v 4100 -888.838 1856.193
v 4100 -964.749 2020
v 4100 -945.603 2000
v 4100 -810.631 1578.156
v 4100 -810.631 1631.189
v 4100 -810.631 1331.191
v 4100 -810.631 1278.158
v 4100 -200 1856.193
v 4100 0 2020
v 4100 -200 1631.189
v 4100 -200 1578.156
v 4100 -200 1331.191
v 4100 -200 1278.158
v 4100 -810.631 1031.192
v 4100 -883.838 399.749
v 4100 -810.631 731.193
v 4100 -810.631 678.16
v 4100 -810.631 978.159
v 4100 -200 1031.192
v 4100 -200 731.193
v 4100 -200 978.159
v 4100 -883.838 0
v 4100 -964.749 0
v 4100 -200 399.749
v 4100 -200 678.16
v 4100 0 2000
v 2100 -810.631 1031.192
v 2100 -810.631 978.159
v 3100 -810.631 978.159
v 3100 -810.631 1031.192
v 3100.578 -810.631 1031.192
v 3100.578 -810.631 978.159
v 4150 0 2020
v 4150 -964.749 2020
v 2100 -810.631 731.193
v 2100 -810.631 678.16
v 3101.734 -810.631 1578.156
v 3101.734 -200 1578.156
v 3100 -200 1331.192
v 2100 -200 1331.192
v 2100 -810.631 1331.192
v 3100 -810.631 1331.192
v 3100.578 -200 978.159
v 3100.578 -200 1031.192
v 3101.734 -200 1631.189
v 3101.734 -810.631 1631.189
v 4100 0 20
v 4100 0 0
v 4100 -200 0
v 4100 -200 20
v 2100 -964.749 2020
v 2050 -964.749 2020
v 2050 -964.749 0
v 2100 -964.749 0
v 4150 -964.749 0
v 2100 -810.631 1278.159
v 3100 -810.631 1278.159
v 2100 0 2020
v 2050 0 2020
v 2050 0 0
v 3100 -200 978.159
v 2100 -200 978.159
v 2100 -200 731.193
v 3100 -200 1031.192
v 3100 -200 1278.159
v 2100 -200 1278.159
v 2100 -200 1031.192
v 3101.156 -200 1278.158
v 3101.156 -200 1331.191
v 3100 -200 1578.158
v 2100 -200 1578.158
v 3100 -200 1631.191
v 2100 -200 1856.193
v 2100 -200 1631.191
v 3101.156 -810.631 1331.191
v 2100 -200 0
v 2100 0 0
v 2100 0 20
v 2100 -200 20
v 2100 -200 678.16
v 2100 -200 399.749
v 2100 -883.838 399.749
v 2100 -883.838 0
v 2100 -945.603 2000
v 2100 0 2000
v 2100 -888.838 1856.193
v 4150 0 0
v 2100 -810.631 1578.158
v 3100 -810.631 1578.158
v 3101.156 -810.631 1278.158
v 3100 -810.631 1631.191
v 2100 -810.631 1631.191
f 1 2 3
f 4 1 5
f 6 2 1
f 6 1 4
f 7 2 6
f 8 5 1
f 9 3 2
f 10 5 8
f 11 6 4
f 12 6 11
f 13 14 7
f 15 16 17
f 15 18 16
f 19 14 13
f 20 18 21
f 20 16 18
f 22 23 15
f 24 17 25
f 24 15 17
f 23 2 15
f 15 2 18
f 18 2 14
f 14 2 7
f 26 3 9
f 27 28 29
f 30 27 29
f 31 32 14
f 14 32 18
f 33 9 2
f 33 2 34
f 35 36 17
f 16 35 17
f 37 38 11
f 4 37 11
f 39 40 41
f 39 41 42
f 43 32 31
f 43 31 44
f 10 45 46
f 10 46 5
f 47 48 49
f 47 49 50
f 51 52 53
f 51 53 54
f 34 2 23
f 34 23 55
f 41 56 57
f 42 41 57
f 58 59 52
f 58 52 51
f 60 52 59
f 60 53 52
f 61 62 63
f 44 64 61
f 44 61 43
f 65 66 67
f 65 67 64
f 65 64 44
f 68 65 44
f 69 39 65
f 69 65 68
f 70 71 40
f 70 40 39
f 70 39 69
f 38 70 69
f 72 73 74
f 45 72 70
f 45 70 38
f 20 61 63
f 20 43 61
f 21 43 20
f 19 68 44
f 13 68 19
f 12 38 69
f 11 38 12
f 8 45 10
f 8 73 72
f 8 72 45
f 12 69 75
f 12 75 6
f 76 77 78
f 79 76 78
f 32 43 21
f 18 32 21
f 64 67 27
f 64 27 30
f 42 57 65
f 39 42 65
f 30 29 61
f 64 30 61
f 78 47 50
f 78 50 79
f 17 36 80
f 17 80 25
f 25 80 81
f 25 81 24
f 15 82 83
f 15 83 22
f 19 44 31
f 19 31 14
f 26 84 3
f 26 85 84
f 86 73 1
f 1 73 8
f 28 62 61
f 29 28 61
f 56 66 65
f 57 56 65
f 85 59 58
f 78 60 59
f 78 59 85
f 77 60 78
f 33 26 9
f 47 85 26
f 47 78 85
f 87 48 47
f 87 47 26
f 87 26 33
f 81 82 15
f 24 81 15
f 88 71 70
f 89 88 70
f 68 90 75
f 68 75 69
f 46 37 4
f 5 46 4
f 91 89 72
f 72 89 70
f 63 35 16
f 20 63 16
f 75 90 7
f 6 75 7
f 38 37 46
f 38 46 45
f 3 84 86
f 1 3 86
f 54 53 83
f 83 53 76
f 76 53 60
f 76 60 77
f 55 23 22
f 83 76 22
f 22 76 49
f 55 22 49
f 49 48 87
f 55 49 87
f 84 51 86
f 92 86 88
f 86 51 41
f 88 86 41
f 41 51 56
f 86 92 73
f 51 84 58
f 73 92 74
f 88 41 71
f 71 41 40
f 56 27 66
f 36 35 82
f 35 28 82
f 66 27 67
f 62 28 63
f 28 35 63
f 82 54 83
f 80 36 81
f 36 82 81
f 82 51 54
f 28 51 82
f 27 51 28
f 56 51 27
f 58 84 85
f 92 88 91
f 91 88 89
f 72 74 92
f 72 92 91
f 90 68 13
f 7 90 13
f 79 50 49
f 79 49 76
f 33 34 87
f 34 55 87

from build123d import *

# Parameters (mm, degrees)
BOSS_EXTRUDE1_DEPTH = 2000
SKETCH2_W           = 143.807096291
SKETCH2_H           = 56.765959062
BOSS_EXTRUDE2_DEPTH = 50
SKETCH3_W           = 50
SKETCH3_H           = 143.807096291
BOSS_EXTRUDE3_DEPTH = 19.145261779
SKETCH4_W           = 2050
SKETCH4_H           = 143.807096291
BOSS_EXTRUDE4_DEPTH = 888.8375165
SKETCH5_W           = 143.807096291
SKETCH5_H           = 945.603475562
BOSS_EXTRUDE5_DEPTH = 50
SKETCH6_W           = 50
SKETCH6_H           = 143.807096291
BOSS_EXTRUDE6_DEPTH = 19.145261779
BOSS_EXTRUDE7_DEPTH = 1856.192903709
SKETCH8_W           = 50
SKETCH8_H           = 964.748737342
BOSS_EXTRUDE8_DEPTH = 20
SKETCH9_W           = 50
SKETCH9_H           = 964.748737342
BOSS_EXTRUDE9_DEPTH = 20
SKETCH10_W          = 2000
SKETCH10_H          = 1456.444166367
CUT_EXTRUDE1_DEPTH  = 683.8375165
SKETCH11_W          = 2000
SKETCH11_H          = 20
CUT_EXTRUDE2_DEPTH  = 200
RIB1_REACH          = 4461.071
SKETCH12_WALL_W     = 10920.142474856
SKETCH12_WALL_H     = 53.033008588
RIB2_START          = -26.516504294
RIB2_OUTLINE_W      = 998.266278858
RIB2_OUTLINE_H      = 610.630552395
RIB2_DEPTH          = 53.033008588
RIB3_START          = -26.516504294
RIB3_OUTLINE_W      = 1000
RIB3_OUTLINE_H      = 610.630552395
RIB3_DEPTH          = 53.033008589
RIB4_START          = -26.516504294
RIB4_OUTLINE_W      = 998.844185905
RIB4_OUTLINE_H      = 610.630552395
RIB4_DEPTH          = 53.033008588
RIB5_START          = -26.516504294
RIB5_OUTLINE_W      = 1000
RIB5_OUTLINE_H      = 610.630552395
RIB5_DEPTH          = 53.033008588
RIB6_START          = -26.516504294
RIB6_OUTLINE_W      = 999.422092953
RIB6_OUTLINE_H      = 610.630552395
RIB6_DEPTH          = 53.033008588
RIB7_START          = -26.516504294
RIB7_OUTLINE_W      = 1000
RIB7_OUTLINE_H      = 610.630552395
RIB7_DEPTH          = 53.033008588


# Read off the part's stored shape, not the designer's step: Rib2, Rib3, Rib4, Rib5, Rib6, Rib7
with BuildPart() as part:
    # Sketch1 → Boss-Extrude1 (new body)
    with BuildSketch(Plane(origin=(4100, 0, 0), x_dir=(0, 0, -1), z_dir=(1, 0, 0))):
        Polygon((-1856.192903709, -888.8375165), (-2000, -888.8375165), (-2000, -945.603475562), align=None)
    extrude(amount=-BOSS_EXTRUDE1_DEPTH)

    # Sketch2 → Boss-Extrude2 (add)
    with BuildSketch(Plane.ZY.offset(-2100)):
        with Locations((1928.096451855, -917.220496031)):
            Rectangle(SKETCH2_W, SKETCH2_H)
    extrude(amount=BOSS_EXTRUDE2_DEPTH)

    # Sketch3 → Boss-Extrude3 (add)
    with BuildSketch(Plane.XZ.offset(945.603475562)):
        with Locations((2075, 1928.096451855)):
            Rectangle(SKETCH3_W, SKETCH3_H)
    extrude(amount=BOSS_EXTRUDE3_DEPTH)

    # Sketch4 → Boss-Extrude4 (add)
    with BuildSketch(Plane(origin=(0, -888.8375165, 0), x_dir=(-1, 0, 0), z_dir=(0, 1, 0))):
        with Locations((-3075, 1928.096451855)):
            Rectangle(SKETCH4_W, SKETCH4_H)
    extrude(amount=BOSS_EXTRUDE4_DEPTH)

    # Sketch5 → Boss-Extrude5 (add)
    with BuildSketch(Plane(origin=(4100, 0, 0), x_dir=(0, 0, -1), z_dir=(1, 0, 0))):
        with Locations((-1928.096451855, -472.801737781)):
            Rectangle(SKETCH5_W, SKETCH5_H)
    extrude(amount=BOSS_EXTRUDE5_DEPTH)

    # Sketch6 → Boss-Extrude6 (add)
    with BuildSketch(Plane.XZ.offset(945.603475562)):
        with Locations((4125, 1928.096451855)):
            Rectangle(SKETCH6_W, SKETCH6_H)
    extrude(amount=BOSS_EXTRUDE6_DEPTH)

    # Sketch7 → Boss-Extrude7 (add)
    with BuildSketch(Plane(origin=(0, 0, 1856.192903709), x_dir=(-1, 0, 0), z_dir=(0, 0, -1))):
        Polygon((-2050, 0), (-2050, -964.748737342), (-2100, -964.748737342), (-2100, -883.8375165), (-4100, -883.8375165), (-4100, -964.748737342), (-4150, -964.748737342), (-4150, 0), align=None)
    extrude(amount=BOSS_EXTRUDE7_DEPTH)

    # Sketch8 → Boss-Extrude8 (add)
    with BuildSketch(Plane.XY.offset(2000)):
        with Locations((2075, -482.374368671)):
            Rectangle(SKETCH8_W, SKETCH8_H)
    extrude(amount=BOSS_EXTRUDE8_DEPTH)

    # Sketch9 → Boss-Extrude9 (add)
    with BuildSketch(Plane.XY.offset(2000)):
        with Locations((4125, -482.374368671)):
            Rectangle(SKETCH9_W, SKETCH9_H)
    extrude(amount=BOSS_EXTRUDE9_DEPTH)

    # Sketch10 → Cut-Extrude1 (cut)
    with BuildSketch(Plane.XZ.offset(883.8375165)):
        with Locations((3100, 1127.970820526)):
            Rectangle(SKETCH10_W, SKETCH10_H)
    extrude(amount=-CUT_EXTRUDE1_DEPTH, mode=Mode.SUBTRACT)

    # Sketch11 → Cut-Extrude2 (cut)
    with BuildSketch(Plane(origin=(0, 0, 0), x_dir=(-1, 0, 0), z_dir=(0, 1, 0))):
        with Locations((-3100, 10)):
            Rectangle(SKETCH11_W, SKETCH11_H)
    extrude(amount=-CUT_EXTRUDE2_DEPTH, mode=Mode.SUBTRACT)

    # Sketch12 wall → Rib1 (add, up to next)
    with BuildSketch(Plane(origin=(3100, -810.630552395, 704.676399414), x_dir=(1, 0, 0), z_dir=(0, 1, 0)), mode=Mode.PRIVATE) as rib1_sk1:
        Rectangle(SKETCH12_WALL_W, SKETCH12_WALL_H)
    rib1_tool1 = extrude(rib1_sk1.sketch, amount=RIB1_REACH, mode=Mode.PRIVATE) - part.part
    add(rib1_tool1.solids().sort_by_distance((3100, -810.630552395, 704.676399414))[0])

    # Rib2 outline → Rib2 (add)
    with BuildSketch(Plane.XY.offset(1604.672929526).offset(RIB2_START)):
        with Locations((3600.866860571, -505.315276197)):
            Rectangle(RIB2_OUTLINE_W, RIB2_OUTLINE_H)
    extrude(amount=RIB2_DEPTH)

    # Rib3 outline → Rib3 (add)
    with BuildSketch(Plane.XY.offset(1604.674599414).offset(RIB3_START)):
        with Locations((2600, -505.315276197)):
            Rectangle(RIB3_OUTLINE_W, RIB3_OUTLINE_H)
    extrude(amount=RIB3_DEPTH)

    # Rib4 outline → Rib4 (add)
    with BuildSketch(Plane.XY.offset(1304.674086156).offset(RIB4_START)):
        with Locations((3600.577907048, -505.315276197)):
            Rectangle(RIB4_OUTLINE_W, RIB4_OUTLINE_H)
    extrude(amount=RIB4_DEPTH)

    # Rib5 outline → Rib5 (add)
    with BuildSketch(Plane.XY.offset(1004.675799414).offset(RIB5_START)):
        with Locations((2600, -505.315276197)):
            Rectangle(RIB5_OUTLINE_W, RIB5_OUTLINE_H)
    extrude(amount=RIB5_DEPTH)

    # Rib6 outline → Rib6 (add)
    with BuildSketch(Plane.XY.offset(1004.675799414).offset(RIB6_START)):
        with Locations((3600.288953523, -505.315276197)):
            Rectangle(RIB6_OUTLINE_W, RIB6_OUTLINE_H)
    extrude(amount=RIB6_DEPTH)

    # Rib7 outline → Rib7 (add)
    with BuildSketch(Plane.XY.offset(1304.675199414).offset(RIB7_START)):
        with Locations((2600, -505.315276197)):
            Rectangle(RIB7_OUTLINE_W, RIB7_OUTLINE_H)
    extrude(amount=RIB7_DEPTH)


solid = part.part
